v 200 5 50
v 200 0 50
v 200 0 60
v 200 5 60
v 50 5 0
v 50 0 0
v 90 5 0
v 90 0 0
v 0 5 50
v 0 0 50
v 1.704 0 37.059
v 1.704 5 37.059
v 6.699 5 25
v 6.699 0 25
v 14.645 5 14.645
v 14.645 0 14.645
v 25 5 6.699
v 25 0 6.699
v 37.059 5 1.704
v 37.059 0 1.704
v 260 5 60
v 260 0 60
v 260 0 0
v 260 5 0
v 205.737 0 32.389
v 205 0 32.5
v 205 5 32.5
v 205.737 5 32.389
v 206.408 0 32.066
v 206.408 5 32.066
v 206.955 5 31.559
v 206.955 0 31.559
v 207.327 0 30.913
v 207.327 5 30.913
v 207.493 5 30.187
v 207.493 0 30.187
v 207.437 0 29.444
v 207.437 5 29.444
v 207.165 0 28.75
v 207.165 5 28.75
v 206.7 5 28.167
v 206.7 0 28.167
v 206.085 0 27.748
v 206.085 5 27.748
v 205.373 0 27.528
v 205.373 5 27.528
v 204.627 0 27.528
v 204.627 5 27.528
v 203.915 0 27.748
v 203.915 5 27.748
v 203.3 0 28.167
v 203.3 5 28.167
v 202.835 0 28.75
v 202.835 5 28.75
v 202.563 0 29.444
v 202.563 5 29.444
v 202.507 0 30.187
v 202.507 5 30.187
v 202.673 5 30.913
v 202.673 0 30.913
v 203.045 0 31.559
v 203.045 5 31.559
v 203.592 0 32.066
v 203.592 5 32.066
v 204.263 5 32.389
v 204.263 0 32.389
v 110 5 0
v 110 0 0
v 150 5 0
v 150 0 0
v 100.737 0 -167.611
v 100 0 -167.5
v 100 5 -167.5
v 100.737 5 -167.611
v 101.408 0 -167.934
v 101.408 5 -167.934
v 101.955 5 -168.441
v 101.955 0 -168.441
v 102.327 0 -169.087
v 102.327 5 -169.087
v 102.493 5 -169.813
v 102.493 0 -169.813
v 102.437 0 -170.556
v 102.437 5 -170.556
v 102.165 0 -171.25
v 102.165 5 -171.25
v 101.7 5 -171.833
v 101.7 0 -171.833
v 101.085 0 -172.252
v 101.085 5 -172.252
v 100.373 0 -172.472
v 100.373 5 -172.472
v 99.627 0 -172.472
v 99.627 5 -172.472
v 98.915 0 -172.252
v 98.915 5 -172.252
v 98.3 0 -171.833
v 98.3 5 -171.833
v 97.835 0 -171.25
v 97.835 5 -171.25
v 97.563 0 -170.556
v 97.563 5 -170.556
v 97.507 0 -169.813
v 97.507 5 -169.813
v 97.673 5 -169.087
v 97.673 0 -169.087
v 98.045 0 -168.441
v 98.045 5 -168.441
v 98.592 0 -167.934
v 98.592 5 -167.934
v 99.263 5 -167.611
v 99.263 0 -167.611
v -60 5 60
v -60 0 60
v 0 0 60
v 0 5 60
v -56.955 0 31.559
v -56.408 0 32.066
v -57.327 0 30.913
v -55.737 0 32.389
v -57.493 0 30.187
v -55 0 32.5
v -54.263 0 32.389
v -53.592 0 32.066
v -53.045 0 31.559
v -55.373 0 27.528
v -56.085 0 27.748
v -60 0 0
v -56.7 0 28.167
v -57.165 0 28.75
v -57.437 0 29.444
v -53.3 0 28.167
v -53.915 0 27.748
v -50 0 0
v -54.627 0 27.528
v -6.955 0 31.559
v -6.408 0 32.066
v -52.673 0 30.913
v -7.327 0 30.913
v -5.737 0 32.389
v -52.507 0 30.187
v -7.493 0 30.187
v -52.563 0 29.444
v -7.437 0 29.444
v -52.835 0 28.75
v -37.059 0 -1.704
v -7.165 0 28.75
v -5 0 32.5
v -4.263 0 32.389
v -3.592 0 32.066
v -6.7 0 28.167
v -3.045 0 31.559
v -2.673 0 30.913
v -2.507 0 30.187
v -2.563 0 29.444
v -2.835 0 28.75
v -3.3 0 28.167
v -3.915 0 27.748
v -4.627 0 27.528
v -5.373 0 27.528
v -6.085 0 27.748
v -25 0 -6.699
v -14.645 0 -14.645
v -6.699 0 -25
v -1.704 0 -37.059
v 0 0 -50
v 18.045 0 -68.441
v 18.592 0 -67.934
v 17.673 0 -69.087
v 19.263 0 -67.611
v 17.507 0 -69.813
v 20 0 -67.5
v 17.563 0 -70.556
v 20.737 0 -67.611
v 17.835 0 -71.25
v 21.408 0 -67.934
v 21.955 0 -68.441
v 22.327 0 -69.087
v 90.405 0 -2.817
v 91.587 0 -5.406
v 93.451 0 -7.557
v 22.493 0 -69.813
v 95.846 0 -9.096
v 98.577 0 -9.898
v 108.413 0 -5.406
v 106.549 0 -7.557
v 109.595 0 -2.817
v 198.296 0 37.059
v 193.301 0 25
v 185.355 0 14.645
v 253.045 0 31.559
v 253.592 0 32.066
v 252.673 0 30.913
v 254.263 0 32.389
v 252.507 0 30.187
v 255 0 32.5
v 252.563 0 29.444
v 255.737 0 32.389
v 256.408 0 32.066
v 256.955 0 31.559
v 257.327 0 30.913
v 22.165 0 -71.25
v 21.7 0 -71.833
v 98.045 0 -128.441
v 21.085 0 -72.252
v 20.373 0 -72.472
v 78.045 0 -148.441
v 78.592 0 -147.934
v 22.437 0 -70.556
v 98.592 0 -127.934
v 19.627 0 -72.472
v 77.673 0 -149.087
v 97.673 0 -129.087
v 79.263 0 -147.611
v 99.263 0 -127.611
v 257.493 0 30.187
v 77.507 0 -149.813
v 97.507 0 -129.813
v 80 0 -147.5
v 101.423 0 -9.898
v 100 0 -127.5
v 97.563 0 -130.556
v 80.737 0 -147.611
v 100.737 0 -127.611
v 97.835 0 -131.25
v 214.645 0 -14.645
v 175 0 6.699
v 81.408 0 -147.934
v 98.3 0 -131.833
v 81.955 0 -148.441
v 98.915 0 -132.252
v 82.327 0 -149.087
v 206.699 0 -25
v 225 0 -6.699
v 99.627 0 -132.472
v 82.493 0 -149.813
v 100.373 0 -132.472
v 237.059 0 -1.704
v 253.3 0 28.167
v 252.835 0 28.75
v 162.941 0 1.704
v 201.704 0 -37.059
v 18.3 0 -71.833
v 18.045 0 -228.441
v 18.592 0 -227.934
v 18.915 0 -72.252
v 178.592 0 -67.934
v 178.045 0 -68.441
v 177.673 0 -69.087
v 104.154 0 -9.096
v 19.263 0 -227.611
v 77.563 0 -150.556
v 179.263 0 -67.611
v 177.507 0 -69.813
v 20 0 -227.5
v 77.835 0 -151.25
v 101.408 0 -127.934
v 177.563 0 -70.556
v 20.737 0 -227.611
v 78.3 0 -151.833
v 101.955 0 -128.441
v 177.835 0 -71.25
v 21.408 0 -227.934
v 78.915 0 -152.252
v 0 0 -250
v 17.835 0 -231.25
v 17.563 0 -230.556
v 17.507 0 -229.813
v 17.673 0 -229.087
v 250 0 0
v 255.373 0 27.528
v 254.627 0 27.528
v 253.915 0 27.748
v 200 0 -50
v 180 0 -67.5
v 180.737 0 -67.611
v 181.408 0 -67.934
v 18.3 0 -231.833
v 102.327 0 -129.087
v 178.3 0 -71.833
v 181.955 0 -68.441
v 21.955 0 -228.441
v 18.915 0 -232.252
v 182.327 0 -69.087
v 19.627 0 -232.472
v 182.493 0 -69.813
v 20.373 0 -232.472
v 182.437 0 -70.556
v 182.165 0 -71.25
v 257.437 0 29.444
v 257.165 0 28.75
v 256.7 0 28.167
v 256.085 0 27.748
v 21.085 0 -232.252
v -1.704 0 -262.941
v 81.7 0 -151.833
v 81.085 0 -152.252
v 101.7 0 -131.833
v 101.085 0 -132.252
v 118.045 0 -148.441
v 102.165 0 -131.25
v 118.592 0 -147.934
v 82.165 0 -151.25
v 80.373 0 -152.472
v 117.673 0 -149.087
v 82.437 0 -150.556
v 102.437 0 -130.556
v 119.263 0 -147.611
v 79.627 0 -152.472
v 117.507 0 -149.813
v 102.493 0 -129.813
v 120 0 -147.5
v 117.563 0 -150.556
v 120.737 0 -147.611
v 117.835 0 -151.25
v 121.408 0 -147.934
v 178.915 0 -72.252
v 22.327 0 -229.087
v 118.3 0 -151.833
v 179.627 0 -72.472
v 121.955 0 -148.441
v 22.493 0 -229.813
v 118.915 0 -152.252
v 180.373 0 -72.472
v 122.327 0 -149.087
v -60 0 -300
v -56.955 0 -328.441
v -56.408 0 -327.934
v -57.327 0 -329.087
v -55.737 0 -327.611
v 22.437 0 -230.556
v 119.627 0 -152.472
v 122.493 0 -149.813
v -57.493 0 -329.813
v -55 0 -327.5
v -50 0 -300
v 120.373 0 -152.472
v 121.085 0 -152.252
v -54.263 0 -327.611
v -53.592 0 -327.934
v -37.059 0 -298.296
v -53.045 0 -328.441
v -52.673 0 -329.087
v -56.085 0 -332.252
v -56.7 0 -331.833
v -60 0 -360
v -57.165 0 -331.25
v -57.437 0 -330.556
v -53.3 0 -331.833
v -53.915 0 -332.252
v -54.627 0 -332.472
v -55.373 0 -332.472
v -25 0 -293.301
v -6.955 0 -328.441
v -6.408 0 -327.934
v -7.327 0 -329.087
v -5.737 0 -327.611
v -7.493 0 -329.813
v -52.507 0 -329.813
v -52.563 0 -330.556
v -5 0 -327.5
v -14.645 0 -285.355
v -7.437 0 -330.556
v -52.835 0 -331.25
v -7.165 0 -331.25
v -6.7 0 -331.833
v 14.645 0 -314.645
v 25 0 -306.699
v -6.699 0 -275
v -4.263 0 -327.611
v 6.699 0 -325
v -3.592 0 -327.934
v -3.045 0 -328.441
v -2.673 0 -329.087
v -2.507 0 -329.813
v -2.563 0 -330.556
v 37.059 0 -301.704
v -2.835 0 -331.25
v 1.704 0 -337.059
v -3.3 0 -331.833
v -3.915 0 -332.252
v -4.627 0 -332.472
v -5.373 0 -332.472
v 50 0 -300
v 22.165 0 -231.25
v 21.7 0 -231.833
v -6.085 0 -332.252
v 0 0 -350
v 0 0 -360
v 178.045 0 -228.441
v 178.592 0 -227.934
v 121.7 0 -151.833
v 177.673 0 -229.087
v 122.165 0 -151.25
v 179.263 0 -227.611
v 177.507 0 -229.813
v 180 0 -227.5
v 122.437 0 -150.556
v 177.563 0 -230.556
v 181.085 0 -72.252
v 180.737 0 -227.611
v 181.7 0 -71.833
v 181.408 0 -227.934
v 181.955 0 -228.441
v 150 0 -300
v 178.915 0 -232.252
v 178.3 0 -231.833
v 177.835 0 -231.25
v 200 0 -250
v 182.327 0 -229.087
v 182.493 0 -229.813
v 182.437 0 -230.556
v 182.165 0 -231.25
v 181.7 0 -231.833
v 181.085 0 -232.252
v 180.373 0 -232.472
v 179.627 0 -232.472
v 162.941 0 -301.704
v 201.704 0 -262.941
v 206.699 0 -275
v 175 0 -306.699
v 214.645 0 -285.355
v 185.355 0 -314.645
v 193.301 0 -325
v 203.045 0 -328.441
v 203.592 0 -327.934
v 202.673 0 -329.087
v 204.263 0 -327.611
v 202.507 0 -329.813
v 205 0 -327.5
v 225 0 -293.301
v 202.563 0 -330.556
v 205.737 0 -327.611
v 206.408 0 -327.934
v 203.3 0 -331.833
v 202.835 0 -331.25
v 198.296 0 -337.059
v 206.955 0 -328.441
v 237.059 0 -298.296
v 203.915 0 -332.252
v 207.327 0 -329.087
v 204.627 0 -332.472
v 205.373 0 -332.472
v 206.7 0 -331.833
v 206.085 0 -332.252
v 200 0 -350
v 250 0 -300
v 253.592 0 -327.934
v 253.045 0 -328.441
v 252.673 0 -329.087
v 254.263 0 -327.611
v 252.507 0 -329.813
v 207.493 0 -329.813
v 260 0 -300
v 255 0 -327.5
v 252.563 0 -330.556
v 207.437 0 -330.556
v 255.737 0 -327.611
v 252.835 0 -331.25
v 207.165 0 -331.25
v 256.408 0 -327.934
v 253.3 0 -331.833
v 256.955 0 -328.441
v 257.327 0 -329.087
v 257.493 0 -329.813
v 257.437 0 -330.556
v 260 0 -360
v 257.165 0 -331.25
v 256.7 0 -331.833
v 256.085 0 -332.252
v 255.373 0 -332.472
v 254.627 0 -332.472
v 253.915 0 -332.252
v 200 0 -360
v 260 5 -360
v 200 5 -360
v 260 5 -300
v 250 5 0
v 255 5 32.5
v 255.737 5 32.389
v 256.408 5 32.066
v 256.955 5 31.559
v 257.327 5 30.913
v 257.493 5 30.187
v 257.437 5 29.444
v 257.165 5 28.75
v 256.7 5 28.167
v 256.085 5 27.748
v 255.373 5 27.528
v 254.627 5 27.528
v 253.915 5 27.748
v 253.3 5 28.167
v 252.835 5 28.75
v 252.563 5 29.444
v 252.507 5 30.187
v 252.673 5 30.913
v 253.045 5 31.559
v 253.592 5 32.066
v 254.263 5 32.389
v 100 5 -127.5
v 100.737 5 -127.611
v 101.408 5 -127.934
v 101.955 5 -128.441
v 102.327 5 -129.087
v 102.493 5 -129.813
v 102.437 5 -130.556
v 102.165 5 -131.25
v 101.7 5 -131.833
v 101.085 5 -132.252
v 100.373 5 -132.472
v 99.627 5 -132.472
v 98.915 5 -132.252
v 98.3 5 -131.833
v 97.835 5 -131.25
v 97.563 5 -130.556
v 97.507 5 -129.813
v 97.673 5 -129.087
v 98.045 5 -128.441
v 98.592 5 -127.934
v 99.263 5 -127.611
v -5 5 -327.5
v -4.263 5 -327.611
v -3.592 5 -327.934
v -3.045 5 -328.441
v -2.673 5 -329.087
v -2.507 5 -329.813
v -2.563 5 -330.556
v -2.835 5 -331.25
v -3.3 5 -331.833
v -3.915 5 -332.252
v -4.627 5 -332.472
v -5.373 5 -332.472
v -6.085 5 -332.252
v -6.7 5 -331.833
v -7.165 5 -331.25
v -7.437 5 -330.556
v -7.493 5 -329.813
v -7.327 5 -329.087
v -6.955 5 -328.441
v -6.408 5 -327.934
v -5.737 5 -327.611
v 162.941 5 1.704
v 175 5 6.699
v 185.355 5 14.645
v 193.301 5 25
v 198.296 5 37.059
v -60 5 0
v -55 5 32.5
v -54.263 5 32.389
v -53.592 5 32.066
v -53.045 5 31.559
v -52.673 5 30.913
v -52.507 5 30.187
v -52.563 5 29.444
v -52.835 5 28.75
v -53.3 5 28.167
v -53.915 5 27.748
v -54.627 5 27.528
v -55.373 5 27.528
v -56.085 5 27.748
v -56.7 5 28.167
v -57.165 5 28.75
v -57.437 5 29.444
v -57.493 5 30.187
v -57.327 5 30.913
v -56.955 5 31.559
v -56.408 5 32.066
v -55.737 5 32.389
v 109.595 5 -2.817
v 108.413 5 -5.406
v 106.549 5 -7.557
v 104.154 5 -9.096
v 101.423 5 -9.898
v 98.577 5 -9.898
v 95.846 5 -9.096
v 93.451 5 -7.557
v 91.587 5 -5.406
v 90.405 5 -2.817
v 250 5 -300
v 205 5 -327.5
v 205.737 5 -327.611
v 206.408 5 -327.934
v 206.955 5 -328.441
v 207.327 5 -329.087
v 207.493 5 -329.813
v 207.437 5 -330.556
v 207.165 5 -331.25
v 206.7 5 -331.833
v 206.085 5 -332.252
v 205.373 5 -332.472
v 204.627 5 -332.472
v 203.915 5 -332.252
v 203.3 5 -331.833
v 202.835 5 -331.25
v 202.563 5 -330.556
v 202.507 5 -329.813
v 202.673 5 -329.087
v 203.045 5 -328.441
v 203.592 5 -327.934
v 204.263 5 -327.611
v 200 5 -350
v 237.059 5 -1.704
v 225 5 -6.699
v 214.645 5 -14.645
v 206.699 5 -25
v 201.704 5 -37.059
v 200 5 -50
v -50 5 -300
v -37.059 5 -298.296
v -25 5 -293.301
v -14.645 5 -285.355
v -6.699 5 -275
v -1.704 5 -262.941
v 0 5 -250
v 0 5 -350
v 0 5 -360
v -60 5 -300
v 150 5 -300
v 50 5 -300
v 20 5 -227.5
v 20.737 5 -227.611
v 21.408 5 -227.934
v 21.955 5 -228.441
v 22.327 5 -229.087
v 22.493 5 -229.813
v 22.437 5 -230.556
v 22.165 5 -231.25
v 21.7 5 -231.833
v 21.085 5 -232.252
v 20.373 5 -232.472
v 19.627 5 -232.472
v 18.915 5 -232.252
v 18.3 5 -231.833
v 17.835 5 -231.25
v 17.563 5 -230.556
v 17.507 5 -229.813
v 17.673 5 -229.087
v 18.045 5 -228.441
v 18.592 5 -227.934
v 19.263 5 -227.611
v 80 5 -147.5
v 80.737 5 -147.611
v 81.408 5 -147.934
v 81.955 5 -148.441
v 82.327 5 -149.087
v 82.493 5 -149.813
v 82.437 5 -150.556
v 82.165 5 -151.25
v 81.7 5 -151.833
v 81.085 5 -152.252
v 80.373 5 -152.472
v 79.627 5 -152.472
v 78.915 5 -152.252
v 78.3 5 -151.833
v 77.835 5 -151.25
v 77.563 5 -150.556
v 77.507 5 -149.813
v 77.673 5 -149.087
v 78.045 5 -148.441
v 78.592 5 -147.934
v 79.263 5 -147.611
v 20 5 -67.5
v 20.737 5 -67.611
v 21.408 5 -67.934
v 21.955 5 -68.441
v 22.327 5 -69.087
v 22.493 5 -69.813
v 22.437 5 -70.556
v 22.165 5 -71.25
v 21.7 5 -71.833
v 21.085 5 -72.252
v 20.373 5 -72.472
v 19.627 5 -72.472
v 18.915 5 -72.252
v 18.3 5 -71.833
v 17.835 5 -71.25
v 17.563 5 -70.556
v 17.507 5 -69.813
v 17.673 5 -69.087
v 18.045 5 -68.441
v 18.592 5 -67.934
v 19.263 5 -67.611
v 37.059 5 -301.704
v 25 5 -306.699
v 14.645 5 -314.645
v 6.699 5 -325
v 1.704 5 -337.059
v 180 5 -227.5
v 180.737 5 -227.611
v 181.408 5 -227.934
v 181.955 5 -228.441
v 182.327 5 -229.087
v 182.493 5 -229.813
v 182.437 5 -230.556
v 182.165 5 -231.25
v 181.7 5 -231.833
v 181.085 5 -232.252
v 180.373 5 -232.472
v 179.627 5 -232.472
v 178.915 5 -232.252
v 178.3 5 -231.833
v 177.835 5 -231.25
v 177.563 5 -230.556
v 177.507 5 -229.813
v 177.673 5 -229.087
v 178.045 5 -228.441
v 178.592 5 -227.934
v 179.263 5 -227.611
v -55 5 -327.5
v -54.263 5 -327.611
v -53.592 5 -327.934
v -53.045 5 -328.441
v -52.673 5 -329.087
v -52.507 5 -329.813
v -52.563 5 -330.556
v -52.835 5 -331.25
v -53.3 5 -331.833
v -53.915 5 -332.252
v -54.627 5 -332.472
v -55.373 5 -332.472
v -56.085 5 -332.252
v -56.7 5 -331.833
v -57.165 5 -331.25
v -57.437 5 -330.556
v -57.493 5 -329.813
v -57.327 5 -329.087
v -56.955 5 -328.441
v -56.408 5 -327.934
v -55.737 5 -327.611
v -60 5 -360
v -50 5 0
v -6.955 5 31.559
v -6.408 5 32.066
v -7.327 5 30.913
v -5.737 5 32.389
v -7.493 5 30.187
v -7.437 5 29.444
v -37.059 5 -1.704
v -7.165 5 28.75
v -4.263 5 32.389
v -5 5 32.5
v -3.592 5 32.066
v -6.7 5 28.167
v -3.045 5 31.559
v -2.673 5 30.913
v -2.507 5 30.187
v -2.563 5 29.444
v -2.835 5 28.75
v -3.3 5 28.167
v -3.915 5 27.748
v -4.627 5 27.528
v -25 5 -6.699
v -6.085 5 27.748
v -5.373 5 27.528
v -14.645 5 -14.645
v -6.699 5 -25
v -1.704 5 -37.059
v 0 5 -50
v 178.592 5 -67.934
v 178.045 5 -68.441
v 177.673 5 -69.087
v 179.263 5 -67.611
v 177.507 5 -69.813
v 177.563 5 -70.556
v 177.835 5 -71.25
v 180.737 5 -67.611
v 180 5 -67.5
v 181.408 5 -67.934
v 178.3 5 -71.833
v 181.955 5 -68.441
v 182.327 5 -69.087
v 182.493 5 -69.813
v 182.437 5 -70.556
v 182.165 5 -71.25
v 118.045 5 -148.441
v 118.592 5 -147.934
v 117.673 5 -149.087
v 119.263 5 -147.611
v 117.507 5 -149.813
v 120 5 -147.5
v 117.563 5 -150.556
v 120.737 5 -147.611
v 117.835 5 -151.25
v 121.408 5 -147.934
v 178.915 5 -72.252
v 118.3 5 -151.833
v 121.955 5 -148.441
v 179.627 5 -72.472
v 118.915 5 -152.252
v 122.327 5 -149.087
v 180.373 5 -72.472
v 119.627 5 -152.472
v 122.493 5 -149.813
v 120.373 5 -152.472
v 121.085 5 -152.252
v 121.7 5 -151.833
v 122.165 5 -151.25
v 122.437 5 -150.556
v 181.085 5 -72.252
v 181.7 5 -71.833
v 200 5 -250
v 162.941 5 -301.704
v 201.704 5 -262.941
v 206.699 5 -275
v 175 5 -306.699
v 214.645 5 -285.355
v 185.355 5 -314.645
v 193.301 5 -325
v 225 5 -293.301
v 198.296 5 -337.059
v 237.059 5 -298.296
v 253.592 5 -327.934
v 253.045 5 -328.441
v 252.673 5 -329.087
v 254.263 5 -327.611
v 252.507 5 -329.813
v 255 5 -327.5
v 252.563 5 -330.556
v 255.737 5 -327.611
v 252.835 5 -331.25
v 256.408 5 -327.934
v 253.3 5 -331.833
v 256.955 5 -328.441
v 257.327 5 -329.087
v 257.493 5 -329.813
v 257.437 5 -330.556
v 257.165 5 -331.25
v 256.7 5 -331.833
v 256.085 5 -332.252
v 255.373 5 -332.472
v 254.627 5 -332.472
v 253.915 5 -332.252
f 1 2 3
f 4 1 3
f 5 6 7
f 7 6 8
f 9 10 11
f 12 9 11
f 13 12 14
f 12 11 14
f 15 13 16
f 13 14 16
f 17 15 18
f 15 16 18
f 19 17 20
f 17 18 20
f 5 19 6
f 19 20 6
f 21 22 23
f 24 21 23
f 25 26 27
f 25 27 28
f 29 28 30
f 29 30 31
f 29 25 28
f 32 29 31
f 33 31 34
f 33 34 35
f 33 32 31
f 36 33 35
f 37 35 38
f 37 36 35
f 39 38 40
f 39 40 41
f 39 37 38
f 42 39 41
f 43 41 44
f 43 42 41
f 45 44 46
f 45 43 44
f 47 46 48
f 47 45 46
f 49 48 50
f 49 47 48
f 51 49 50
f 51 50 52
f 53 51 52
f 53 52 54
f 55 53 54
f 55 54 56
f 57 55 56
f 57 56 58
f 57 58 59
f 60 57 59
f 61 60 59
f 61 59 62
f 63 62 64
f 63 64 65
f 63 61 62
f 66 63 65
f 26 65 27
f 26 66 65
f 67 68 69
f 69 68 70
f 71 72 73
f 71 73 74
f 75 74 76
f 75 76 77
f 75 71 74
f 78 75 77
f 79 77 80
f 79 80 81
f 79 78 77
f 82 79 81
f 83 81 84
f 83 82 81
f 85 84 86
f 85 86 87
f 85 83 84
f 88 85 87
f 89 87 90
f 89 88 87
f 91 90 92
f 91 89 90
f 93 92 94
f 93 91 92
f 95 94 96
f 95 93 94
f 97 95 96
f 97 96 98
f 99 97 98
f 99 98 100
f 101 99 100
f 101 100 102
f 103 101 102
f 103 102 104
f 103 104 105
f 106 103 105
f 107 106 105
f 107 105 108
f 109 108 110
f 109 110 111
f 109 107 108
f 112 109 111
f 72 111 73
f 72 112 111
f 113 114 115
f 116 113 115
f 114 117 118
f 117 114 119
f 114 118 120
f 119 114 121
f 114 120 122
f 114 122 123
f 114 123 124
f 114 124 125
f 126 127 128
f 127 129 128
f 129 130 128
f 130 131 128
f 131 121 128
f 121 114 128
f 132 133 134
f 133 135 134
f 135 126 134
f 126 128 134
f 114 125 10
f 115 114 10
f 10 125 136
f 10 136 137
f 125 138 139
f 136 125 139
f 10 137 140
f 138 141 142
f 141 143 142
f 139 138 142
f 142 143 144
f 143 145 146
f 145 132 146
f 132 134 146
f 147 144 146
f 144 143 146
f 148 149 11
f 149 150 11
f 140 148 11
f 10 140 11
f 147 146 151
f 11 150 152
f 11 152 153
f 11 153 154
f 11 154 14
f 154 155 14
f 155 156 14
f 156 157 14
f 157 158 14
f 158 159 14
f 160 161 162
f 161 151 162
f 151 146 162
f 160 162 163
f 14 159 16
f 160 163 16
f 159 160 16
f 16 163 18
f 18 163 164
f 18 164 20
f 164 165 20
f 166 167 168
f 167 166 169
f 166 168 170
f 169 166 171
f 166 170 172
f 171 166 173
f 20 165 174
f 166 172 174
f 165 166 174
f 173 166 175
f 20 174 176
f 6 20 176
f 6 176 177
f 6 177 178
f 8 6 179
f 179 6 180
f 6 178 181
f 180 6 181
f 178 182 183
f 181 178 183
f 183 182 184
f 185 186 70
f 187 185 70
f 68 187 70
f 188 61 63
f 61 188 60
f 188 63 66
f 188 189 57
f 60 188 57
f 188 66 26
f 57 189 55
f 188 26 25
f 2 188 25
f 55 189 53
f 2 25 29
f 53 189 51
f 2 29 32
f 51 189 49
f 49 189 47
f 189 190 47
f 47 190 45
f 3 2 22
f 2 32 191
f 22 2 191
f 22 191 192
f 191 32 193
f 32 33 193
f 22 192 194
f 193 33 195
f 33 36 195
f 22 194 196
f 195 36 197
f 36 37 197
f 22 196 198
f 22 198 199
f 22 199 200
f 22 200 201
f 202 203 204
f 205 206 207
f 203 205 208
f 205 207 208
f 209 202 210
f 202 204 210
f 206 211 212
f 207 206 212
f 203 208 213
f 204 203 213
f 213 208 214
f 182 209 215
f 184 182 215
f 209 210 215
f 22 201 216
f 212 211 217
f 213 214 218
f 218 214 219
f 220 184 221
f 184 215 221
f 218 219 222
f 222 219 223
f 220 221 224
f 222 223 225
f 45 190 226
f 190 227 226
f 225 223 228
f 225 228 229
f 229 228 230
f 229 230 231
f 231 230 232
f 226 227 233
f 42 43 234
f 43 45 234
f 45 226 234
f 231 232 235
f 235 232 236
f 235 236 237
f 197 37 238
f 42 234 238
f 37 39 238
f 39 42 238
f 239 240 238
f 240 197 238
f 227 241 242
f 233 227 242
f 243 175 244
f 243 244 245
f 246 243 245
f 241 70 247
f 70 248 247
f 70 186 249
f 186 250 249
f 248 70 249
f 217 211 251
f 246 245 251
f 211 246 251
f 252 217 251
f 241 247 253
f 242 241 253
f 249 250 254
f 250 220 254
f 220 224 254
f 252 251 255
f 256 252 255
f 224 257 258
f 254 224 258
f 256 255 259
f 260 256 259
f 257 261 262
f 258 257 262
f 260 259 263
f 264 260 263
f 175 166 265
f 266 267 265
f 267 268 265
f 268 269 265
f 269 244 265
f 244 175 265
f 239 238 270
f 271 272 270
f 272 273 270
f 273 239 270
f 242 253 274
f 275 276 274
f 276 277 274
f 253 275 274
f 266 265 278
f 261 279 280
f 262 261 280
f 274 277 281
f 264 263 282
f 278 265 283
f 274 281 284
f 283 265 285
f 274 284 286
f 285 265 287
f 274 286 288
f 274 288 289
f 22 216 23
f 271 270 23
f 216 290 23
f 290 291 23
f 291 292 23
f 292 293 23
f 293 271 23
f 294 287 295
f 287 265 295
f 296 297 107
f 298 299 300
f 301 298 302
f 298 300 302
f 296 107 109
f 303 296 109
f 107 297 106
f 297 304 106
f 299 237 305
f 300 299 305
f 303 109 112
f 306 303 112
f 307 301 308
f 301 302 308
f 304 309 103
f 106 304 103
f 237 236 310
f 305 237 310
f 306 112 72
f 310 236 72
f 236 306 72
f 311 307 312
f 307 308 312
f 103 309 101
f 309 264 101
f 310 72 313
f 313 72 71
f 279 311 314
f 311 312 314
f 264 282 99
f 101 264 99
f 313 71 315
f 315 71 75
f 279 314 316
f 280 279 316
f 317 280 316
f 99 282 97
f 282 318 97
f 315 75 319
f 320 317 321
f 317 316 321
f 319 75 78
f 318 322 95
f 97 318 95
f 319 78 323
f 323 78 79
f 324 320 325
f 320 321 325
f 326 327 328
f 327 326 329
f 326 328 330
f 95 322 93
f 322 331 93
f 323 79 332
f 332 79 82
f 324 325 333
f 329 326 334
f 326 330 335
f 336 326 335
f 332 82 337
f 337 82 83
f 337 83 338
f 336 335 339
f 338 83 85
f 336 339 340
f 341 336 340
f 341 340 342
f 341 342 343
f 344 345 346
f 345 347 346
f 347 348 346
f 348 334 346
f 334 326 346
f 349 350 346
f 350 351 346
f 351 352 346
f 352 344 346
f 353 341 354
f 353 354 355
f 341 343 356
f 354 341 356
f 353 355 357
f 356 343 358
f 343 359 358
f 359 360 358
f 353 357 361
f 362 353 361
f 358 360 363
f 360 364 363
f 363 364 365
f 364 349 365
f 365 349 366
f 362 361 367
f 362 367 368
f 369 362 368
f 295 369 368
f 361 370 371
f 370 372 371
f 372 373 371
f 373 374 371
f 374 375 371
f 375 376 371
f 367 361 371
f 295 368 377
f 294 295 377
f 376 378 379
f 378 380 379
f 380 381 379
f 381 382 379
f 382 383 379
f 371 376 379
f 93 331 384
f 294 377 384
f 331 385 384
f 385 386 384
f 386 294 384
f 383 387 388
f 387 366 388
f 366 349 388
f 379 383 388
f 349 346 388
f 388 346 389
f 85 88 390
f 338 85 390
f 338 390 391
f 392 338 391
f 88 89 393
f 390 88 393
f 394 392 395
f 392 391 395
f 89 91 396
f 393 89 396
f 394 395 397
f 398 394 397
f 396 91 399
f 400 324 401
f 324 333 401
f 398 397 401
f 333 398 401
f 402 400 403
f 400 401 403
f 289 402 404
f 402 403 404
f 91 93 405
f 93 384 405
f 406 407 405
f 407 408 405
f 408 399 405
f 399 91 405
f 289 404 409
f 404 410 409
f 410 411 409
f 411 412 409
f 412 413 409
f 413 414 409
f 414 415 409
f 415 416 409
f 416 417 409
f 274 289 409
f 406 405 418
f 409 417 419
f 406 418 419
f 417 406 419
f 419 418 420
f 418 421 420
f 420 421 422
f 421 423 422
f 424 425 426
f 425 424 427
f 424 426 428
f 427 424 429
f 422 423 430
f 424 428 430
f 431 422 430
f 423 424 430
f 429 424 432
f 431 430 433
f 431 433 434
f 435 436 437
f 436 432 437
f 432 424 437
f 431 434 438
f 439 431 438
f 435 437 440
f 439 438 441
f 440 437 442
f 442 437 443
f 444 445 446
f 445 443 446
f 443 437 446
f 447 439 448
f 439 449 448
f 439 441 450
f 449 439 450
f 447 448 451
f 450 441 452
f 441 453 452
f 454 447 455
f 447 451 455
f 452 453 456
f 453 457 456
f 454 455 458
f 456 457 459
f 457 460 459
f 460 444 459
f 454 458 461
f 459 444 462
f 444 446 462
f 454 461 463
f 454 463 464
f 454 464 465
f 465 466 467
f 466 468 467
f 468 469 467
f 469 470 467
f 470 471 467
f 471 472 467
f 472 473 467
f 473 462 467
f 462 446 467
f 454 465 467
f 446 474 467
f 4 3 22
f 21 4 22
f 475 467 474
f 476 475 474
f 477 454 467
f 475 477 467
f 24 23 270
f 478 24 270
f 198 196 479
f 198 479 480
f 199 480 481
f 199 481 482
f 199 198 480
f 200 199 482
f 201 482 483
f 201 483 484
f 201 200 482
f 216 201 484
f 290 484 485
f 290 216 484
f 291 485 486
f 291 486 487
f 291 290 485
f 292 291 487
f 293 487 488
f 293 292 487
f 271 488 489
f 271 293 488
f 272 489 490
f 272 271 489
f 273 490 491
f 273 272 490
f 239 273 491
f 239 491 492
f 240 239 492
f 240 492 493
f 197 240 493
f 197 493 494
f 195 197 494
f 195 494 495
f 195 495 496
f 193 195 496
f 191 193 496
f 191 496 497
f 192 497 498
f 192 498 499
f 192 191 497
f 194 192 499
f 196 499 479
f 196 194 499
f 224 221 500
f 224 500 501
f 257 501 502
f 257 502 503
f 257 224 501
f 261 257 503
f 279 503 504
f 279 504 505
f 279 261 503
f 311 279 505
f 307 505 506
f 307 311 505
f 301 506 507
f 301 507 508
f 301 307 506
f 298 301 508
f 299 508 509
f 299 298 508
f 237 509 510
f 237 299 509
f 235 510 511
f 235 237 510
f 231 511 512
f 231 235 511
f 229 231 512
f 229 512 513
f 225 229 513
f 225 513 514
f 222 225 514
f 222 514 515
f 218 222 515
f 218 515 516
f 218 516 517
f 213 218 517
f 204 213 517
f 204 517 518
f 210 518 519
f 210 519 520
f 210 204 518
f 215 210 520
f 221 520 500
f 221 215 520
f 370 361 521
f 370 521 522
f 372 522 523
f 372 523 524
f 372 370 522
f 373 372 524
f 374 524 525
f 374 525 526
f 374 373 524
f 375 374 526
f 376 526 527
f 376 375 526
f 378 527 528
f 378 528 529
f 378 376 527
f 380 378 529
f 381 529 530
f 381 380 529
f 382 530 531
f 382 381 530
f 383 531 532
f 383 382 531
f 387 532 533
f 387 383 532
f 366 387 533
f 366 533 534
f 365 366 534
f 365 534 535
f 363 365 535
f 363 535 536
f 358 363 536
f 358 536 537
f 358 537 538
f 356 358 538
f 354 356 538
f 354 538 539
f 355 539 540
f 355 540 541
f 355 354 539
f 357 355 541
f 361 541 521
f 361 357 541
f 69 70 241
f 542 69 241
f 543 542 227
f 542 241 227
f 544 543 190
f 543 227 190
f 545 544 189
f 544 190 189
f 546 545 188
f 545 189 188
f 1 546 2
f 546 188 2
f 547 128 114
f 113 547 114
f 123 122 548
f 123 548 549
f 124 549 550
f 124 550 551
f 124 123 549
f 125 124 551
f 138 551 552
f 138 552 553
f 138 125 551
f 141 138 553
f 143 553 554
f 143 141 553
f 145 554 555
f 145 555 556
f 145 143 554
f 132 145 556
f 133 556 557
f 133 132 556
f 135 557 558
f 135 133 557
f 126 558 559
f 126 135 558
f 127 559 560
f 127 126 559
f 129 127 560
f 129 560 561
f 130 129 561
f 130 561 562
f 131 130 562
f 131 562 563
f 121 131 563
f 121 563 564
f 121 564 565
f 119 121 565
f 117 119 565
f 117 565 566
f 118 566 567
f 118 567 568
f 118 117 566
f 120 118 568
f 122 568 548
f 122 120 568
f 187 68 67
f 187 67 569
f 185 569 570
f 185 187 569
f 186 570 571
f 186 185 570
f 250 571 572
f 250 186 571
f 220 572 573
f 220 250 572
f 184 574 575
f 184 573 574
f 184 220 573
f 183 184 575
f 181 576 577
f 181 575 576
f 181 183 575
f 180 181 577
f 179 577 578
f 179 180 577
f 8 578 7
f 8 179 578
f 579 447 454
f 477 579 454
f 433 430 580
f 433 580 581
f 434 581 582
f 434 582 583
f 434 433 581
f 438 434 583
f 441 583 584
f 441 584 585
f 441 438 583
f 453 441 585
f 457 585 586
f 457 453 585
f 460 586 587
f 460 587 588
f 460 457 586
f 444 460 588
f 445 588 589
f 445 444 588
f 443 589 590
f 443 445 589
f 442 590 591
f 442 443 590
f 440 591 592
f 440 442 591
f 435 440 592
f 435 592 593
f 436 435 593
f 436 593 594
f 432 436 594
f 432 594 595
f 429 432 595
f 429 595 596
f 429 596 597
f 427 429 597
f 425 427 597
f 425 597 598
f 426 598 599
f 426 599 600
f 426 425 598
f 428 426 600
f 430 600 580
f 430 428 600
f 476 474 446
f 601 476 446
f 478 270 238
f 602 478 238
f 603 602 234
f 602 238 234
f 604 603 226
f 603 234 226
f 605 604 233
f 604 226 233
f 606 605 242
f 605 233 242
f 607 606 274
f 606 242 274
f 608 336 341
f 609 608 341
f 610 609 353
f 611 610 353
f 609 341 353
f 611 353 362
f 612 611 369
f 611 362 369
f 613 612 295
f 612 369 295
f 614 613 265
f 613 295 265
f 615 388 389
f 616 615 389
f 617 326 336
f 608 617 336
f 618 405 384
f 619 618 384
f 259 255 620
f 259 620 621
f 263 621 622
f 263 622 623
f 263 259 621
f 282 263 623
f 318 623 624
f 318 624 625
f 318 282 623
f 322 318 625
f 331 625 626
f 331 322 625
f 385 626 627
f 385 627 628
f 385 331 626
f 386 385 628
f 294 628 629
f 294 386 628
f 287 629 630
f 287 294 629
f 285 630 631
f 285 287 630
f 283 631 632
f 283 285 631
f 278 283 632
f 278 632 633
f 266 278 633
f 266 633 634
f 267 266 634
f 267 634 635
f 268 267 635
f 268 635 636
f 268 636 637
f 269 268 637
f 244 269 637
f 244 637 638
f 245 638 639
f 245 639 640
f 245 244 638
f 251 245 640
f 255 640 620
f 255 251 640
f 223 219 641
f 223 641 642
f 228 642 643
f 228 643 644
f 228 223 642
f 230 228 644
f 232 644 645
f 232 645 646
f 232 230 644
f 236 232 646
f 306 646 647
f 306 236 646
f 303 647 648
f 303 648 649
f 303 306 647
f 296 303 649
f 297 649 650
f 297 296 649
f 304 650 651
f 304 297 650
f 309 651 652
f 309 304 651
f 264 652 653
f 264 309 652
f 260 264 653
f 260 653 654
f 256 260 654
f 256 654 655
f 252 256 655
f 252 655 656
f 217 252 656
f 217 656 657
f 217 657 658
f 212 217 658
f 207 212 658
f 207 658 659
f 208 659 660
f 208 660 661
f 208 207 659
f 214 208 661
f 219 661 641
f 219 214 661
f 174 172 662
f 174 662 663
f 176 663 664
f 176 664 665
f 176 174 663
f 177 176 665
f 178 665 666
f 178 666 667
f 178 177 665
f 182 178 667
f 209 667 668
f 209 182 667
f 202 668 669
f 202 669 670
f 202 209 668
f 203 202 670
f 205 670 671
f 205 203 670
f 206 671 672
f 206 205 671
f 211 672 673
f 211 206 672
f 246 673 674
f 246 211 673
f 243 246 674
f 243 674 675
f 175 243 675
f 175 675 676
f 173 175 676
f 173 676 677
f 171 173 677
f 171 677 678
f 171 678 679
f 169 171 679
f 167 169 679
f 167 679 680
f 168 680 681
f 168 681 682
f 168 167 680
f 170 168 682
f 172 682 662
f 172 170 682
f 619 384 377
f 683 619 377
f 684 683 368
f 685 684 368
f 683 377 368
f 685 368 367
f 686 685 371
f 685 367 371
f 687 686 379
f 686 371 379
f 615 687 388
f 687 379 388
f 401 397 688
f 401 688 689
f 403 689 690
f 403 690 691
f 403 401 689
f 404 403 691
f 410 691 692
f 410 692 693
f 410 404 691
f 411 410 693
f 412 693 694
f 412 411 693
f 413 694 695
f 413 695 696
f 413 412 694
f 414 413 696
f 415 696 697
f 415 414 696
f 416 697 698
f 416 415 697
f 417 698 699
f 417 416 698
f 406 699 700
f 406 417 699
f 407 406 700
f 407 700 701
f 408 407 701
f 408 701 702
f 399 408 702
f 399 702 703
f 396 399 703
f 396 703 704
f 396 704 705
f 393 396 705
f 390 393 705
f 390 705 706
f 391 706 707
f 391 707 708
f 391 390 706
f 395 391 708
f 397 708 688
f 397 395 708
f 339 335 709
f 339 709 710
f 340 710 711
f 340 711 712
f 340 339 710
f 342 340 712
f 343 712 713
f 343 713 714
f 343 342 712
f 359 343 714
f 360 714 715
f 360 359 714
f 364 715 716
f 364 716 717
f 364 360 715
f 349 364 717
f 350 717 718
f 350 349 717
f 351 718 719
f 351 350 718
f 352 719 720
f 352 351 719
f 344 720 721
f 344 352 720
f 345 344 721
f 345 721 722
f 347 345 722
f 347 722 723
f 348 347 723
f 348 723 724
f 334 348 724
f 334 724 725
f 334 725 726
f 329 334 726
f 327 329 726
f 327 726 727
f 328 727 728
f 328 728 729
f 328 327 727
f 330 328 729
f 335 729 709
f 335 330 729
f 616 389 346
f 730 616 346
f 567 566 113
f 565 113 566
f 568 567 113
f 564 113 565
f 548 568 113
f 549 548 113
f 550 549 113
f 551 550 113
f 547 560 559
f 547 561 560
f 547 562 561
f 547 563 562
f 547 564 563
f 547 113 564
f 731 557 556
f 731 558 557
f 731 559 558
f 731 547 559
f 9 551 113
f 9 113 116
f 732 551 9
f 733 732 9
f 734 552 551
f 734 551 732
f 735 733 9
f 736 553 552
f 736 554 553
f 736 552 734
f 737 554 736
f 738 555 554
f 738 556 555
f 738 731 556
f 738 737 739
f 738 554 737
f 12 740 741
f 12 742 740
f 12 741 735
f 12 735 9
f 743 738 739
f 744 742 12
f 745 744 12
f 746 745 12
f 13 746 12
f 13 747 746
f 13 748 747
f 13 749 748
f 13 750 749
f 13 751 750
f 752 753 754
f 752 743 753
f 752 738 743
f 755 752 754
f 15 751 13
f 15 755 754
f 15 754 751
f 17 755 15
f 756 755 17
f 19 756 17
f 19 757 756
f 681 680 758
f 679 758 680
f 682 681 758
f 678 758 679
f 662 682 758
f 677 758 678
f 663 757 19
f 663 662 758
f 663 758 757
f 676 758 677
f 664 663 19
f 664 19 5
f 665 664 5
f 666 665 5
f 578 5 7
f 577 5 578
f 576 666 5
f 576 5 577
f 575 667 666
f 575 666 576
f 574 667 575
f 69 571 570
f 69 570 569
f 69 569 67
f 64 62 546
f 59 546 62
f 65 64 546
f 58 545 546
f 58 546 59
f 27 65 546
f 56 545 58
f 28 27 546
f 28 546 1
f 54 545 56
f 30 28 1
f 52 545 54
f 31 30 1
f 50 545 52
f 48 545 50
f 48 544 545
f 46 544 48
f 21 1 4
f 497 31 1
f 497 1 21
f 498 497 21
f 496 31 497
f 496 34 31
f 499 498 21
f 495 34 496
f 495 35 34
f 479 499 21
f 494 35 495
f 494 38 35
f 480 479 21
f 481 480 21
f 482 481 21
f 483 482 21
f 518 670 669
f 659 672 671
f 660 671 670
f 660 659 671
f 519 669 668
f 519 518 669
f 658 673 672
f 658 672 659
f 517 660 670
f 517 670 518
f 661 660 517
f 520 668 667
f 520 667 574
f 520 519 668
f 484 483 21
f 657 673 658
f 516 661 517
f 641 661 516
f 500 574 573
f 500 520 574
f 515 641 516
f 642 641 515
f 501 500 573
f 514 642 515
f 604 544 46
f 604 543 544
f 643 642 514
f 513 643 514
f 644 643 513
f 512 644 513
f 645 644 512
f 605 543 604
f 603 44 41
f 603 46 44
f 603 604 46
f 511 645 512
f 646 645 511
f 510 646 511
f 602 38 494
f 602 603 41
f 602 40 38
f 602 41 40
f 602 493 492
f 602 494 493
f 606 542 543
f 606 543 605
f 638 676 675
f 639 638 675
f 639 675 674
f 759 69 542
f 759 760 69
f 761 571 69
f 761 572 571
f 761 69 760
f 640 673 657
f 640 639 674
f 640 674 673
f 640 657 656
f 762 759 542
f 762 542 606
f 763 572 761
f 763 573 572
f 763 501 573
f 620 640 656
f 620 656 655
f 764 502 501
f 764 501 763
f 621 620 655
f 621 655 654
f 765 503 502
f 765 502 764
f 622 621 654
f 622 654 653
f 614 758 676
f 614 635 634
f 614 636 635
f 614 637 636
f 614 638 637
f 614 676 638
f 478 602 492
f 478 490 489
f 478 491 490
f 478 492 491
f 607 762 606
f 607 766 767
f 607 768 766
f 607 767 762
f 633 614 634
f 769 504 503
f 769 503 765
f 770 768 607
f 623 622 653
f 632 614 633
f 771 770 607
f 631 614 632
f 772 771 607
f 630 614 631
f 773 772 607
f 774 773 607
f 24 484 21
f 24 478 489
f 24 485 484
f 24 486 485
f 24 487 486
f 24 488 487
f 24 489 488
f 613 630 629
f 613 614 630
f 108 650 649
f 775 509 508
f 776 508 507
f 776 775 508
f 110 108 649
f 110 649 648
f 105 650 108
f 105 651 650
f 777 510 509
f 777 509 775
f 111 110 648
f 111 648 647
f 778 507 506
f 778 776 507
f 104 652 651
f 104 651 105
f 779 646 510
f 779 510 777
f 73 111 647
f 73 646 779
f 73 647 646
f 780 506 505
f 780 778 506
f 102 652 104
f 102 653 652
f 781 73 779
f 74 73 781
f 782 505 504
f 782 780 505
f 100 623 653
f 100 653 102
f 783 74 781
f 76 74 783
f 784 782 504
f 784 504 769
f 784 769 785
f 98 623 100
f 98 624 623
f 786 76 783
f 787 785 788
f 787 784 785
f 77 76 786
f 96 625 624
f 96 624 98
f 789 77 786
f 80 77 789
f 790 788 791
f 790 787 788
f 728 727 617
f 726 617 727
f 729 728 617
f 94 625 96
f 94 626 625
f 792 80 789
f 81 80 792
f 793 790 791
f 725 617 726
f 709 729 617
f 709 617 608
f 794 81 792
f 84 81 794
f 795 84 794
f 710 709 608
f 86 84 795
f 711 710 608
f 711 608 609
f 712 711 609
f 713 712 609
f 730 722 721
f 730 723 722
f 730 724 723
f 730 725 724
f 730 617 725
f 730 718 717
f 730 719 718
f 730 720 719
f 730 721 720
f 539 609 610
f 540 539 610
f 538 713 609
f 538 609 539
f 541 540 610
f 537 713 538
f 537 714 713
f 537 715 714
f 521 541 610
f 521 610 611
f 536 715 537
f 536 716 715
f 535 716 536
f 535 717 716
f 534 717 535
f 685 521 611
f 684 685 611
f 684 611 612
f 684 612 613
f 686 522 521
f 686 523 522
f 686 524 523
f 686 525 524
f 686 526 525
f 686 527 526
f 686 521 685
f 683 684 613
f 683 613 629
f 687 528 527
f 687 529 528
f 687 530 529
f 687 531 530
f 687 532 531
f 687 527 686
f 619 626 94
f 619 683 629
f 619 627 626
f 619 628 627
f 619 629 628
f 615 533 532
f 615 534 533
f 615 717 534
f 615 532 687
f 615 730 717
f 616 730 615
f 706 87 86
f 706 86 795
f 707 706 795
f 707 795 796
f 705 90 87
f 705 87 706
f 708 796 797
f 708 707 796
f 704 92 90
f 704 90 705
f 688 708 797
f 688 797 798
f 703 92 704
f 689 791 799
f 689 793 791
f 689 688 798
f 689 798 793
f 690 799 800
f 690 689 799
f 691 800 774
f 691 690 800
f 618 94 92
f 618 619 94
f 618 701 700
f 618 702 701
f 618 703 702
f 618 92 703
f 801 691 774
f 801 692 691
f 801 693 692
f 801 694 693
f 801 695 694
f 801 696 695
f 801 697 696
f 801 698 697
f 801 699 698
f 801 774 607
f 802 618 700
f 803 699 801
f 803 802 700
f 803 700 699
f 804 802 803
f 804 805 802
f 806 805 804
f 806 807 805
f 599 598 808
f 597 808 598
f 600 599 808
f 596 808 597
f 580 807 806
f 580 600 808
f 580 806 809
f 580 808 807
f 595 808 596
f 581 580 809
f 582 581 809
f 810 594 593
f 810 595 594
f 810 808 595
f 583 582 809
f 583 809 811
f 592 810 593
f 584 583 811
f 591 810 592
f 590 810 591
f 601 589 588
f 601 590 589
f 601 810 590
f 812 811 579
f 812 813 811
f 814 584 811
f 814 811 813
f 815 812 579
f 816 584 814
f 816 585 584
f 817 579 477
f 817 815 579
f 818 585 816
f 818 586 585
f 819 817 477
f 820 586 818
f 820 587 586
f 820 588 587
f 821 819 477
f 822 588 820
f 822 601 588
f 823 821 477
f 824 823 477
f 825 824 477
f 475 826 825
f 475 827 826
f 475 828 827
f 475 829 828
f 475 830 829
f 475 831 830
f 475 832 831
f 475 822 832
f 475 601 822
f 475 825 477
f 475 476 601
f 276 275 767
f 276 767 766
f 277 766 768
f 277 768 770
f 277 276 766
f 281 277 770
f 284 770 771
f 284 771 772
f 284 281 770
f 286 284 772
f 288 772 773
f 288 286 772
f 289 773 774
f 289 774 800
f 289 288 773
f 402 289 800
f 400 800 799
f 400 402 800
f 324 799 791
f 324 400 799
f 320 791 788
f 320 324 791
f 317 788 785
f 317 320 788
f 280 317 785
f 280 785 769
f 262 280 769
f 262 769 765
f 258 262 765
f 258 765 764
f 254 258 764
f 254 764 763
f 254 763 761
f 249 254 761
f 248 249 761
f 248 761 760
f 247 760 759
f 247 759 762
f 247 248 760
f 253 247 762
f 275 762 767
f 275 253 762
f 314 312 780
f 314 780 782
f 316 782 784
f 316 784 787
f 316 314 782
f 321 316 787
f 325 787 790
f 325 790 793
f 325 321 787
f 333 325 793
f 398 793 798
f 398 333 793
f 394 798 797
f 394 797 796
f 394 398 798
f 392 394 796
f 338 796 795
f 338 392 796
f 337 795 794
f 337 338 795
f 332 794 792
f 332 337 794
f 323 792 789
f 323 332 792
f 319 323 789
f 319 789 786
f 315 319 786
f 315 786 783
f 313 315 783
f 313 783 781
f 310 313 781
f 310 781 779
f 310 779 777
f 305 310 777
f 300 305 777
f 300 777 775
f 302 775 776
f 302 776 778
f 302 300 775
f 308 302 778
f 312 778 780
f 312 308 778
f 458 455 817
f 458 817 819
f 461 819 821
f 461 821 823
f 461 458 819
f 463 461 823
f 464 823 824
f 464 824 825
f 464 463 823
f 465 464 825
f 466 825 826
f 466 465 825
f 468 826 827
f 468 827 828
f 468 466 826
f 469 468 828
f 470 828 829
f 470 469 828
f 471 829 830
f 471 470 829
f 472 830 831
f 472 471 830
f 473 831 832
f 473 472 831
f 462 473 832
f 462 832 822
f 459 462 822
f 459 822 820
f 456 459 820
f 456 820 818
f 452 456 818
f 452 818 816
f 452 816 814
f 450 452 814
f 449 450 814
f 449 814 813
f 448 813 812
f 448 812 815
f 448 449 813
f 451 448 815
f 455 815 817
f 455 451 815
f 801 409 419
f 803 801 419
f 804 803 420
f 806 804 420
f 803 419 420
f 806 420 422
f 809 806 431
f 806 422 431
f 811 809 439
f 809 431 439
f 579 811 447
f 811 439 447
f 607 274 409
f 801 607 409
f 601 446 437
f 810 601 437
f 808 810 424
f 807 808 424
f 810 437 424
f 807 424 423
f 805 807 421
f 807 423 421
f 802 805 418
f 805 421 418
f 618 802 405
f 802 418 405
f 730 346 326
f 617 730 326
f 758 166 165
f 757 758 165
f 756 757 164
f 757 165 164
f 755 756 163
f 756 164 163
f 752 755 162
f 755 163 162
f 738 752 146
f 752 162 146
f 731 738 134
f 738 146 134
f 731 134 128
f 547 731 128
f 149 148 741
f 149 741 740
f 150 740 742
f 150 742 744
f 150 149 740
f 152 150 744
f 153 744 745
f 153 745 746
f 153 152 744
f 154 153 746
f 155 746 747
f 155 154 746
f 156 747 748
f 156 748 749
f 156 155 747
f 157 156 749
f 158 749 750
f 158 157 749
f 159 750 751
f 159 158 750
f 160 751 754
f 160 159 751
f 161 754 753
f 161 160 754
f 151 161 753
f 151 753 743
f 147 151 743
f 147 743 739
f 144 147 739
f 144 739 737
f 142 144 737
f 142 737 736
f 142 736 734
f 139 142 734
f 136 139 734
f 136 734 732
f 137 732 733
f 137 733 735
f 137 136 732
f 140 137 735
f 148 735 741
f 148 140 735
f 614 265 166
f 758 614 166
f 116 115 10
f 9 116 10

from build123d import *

# Parameters (mm, degrees)
SKETCH1_R               = 2.5
BOSS_EXTRUDE1_DEPTH     = 5
CUT_EXTRUDE2_DEPTH      = 445.100213916
CUT_EXTRUDE2_DEPTH_BACK = 445.100213916


with BuildPart() as part:
    # Sketch1 → Boss-Extrude1 (new body)
    with BuildSketch(Plane(origin=(0, 0, 0), x_dir=(1, 0, 0), z_dir=(0, 1, 0))):
        with BuildLine():
            Line((50, 0), (150, 0))
            ThreePointArc((150, 0), (185.355339059, -14.644660941), (200, -50))
            Line((200, -50), (200, -60))
            Line((200, -60), (260, -60))
            Line((260, -60), (260, 0))
            Line((260, 0), (250, 0))
            ThreePointArc((250, 0), (214.644660941, 14.644660941), (200, 50))
            Line((200, 50), (200, 250))
            ThreePointArc((200, 250), (214.644660941, 285.355339059), (250, 300))
            Line((250, 300), (260, 300))
            Line((260, 300), (260, 360))
            Line((260, 360), (200, 360))
            Line((200, 360), (200, 350))
            ThreePointArc((200, 350), (185.355339059, 314.644660941), (150, 300))
            Line((150, 300), (50, 300))
            ThreePointArc((50, 300), (14.644660941, 314.644660941), (0, 350))
            Line((0, 350), (0, 360))
            Line((0, 360), (-60, 360))
            Line((-60, 360), (-60, 300))
            Line((-60, 300), (-50, 300))
            ThreePointArc((-50, 300), (-14.644660941, 285.355339059), (0, 250))
            Line((0, 250), (0, 50))
            ThreePointArc((0, 50), (-14.644660941, 14.644660941), (-50, 0))
            Line((-50, 0), (-60, 0))
            Line((-60, 0), (-60, -60))
            Line((-60, -60), (0, -60))
            Line((0, -60), (0, -50))
            ThreePointArc((0, -50), (14.644660941, -14.644660941), (50, 0))
        make_face()
        with Locations(Location((20, 230, 0), (0, 0, 270))):
            Circle(SKETCH1_R, mode=Mode.SUBTRACT)
        with Locations(Location((20, 70, 0), (0, 0, 270))):
            Circle(SKETCH1_R, mode=Mode.SUBTRACT)
        with Locations(Location((180, 70, 0), (0, 0, 270))):
            Circle(SKETCH1_R, mode=Mode.SUBTRACT)
        with Locations(Location((180, 230, 0), (0, 0, 270))):
            Circle(SKETCH1_R, mode=Mode.SUBTRACT)
        with Locations(Location((-55, -30, 0), (0, 0, 270))):
            Circle(SKETCH1_R, mode=Mode.SUBTRACT)
        with Locations(Location((-5, -30, 0), (0, 0, 270))):
            Circle(SKETCH1_R, mode=Mode.SUBTRACT)
        with Locations(Location((-55, 330, 0), (0, 0, 270))):
            Circle(SKETCH1_R, mode=Mode.SUBTRACT)
        with Locations(Location((-5, 330, 0), (0, 0, 270))):
            Circle(SKETCH1_R, mode=Mode.SUBTRACT)
        with Locations(Location((205, 330, 0), (0, 0, 270))):
            Circle(SKETCH1_R, mode=Mode.SUBTRACT)
        with Locations(Location((255, 330, 0), (0, 0, 270))):
            Circle(SKETCH1_R, mode=Mode.SUBTRACT)
        with Locations(Location((205, -30, 0), (0, 0, 270))):
            Circle(SKETCH1_R, mode=Mode.SUBTRACT)
        with Locations(Location((255, -30, 0), (0, 0, 270))):
            Circle(SKETCH1_R, mode=Mode.SUBTRACT)
        with Locations(Location((100, 170, 0), (0, 0, 270))):
            Circle(SKETCH1_R, mode=Mode.SUBTRACT)
        with Locations(Location((120, 150, 0), (0, 0, 270))):
            Circle(SKETCH1_R, mode=Mode.SUBTRACT)
        with Locations(Location((80, 150, 0), (0, 0, 270))):
            Circle(SKETCH1_R, mode=Mode.SUBTRACT)
        with Locations(Location((100, 130, 0), (0, 0, 270))):
            Circle(SKETCH1_R, mode=Mode.SUBTRACT)
    extrude(amount=BOSS_EXTRUDE1_DEPTH)

    # Sketch3 → Cut-Extrude2 (cut, two sides: drawn at the far end of the back side and taken through both)
    with BuildSketch(Plane(origin=(0, 5, 0), x_dir=(1, 0, 0), z_dir=(0, 1, 0)).offset(-CUT_EXTRUDE2_DEPTH_BACK)):
        with BuildLine():
            Line((110, -806.241169496), (110, 0))
            ThreePointArc((110, 0), (100, 10), (90, 0))
            Line((90, 0), (90, -806.241169496))
            Line((90, -806.241169496), (90, -2418.723508487))
            Line((90, -2418.723508487), (110, -2418.723508487))
            Line((110, -2418.723508487), (110, -806.241169496))
        make_face()
    extrude(amount=CUT_EXTRUDE2_DEPTH + CUT_EXTRUDE2_DEPTH_BACK, mode=Mode.SUBTRACT)


solid = part.part
